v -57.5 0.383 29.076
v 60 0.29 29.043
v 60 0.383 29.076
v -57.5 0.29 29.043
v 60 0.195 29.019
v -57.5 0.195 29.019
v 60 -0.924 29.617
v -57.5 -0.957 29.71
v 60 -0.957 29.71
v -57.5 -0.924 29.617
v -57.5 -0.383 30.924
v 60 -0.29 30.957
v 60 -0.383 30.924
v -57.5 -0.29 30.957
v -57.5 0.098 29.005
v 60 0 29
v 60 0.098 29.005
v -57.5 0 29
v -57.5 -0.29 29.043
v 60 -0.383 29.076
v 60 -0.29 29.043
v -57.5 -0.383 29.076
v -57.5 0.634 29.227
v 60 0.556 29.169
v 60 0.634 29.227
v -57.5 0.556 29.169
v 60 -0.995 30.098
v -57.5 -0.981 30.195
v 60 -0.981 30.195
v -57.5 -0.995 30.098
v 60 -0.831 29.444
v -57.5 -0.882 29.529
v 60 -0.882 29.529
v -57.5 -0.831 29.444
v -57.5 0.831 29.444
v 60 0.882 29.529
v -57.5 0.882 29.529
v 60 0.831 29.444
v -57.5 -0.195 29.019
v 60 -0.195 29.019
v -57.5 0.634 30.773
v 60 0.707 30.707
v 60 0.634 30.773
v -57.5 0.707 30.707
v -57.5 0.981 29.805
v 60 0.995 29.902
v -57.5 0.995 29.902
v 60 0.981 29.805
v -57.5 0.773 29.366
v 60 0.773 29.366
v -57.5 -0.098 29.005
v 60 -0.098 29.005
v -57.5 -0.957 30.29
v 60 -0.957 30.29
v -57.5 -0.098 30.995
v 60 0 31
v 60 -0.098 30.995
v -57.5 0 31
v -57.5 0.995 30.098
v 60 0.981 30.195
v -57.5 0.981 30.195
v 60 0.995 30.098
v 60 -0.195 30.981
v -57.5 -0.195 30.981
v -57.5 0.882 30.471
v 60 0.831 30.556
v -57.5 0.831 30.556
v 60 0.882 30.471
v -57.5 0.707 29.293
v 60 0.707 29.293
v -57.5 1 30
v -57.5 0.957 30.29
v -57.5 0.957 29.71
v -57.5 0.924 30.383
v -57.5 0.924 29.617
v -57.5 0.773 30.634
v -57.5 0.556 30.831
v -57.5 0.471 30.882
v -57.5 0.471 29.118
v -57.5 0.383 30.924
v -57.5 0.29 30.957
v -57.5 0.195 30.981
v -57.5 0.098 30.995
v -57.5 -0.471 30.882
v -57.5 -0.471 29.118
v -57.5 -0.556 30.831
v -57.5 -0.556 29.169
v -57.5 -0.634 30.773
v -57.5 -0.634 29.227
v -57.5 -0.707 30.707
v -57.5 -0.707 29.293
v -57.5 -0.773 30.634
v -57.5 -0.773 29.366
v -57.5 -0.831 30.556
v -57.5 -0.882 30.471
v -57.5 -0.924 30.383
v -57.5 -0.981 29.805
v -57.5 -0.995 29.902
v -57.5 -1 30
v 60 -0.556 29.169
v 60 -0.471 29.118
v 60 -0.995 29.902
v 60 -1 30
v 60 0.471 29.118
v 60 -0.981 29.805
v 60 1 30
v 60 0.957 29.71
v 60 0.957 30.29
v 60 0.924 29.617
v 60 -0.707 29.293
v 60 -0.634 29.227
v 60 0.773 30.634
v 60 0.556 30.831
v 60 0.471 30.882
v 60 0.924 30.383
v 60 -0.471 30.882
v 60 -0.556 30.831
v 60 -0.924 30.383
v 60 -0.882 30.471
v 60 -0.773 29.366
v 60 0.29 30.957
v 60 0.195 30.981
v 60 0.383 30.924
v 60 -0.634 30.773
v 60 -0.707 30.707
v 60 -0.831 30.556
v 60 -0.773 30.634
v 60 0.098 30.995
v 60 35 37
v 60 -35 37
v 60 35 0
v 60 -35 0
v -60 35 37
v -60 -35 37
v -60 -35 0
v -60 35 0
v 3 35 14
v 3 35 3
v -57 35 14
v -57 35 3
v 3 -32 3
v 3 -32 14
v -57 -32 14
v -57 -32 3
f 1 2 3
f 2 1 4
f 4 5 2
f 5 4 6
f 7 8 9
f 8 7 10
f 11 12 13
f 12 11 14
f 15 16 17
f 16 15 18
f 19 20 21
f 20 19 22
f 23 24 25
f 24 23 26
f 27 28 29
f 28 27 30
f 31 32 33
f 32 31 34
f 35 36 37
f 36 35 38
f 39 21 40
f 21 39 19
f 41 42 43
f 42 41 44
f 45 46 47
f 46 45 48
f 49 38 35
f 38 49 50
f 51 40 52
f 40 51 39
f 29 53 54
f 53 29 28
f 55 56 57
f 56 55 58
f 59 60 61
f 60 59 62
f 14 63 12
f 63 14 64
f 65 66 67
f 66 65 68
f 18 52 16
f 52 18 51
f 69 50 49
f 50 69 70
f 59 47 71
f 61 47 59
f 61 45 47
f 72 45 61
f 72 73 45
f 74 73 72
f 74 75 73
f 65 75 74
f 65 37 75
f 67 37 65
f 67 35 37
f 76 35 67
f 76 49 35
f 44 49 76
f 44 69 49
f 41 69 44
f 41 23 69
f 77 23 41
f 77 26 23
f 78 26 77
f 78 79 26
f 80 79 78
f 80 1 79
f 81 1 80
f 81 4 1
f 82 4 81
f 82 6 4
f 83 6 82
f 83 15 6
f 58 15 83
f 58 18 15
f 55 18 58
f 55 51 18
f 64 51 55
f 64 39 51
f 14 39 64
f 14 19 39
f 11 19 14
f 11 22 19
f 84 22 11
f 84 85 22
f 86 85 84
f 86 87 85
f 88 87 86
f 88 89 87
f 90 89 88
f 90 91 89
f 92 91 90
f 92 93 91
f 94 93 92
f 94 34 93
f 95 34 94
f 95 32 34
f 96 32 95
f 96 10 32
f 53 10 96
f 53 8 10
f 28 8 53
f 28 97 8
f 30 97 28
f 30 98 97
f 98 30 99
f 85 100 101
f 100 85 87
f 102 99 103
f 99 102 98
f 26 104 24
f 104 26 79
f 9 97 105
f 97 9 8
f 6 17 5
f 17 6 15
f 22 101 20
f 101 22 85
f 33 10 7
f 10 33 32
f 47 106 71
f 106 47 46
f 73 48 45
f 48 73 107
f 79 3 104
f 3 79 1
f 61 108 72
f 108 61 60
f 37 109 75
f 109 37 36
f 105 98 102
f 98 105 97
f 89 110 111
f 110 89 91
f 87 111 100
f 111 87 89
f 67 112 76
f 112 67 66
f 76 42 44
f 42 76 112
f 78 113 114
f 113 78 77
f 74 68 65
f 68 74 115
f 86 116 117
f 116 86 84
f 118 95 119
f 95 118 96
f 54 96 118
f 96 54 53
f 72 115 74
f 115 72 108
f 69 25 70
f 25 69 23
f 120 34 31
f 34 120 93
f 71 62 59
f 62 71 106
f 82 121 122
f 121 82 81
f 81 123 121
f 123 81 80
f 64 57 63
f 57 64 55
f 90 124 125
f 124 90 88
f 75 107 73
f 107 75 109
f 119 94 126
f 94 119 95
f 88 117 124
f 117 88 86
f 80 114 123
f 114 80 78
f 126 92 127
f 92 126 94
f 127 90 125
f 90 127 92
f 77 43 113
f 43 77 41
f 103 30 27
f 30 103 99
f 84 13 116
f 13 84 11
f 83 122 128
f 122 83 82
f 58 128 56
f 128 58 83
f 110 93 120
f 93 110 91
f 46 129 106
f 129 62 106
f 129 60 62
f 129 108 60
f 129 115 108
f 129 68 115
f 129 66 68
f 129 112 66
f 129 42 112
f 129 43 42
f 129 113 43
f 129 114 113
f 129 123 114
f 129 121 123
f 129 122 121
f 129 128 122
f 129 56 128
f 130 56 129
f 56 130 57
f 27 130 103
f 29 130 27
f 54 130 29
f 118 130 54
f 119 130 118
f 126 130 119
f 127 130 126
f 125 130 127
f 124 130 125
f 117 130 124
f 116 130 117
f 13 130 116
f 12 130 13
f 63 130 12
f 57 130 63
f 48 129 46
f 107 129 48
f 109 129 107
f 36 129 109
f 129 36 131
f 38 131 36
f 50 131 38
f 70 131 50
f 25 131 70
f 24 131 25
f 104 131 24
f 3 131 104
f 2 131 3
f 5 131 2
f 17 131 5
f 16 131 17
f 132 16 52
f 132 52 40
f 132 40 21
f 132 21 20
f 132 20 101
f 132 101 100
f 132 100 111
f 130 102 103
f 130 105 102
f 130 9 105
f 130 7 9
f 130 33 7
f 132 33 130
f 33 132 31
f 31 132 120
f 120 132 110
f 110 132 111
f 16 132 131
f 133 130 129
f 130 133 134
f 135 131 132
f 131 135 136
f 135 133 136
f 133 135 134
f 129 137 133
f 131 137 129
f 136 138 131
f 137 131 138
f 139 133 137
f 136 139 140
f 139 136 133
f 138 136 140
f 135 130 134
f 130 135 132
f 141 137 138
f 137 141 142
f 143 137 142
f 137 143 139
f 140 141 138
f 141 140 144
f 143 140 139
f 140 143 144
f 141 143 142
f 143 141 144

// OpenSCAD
// Mini horizontal gel-electrophoresis box - buffer tank
// Units: mm. Print orientation: base on XY plane, building +Z.

// ---------- Parameters ----------
outer_x      = 120;   // tank outer length (X)
outer_y      = 70;    // tank outer width (Y)
outer_z      = 40;    // tank outer height (Z)
wall         = 3;     // wall thickness
floor        = 3;     // floor thickness
platform_x   = 60;    // platform length in X
platform_y   = outer_y; // platform spans full inner width (Y)
platform_top = 13;    // platform top height (z = floor + 10)
hole_d       = 2;     // electrode hole diameter
hole_y       = 0;     // hole Y position
hole_z       = 30;    // hole Z position
eps          = 0.5;   // cutter overshoot past faces

$fn = 64;

// ---------- Derived ----------
inner_x = outer_x - 2 * wall;   // 114
inner_y = outer_y - 2 * wall;   // 64
inner_z = outer_z - floor;      // 37 (floor at z = 0..3)

// ---------- Model ----------
difference() {
    // Tank body (open top)
    translate([-outer_x/2, -outer_y/2, 0])
        cube([outer_x, outer_y, outer_z - floor]);

    // Raised platform (solid, no hole through it)
    translate([-inner_x/2, -inner_y/2, floor])
        cube([platform_x, platform_y, platform_top - floor + 1]);

    // Electrode holes through each end wall, along X
    for (sx = [-1, 1])
        translate([sx > 0 ? inner_x/2 - eps : -inner_x/2 - eps,
                   hole_y, hole_z])
            rotate([0, 90, 0])
                cylinder(d = hole_d, h = outer_x + 2*eps);
}
